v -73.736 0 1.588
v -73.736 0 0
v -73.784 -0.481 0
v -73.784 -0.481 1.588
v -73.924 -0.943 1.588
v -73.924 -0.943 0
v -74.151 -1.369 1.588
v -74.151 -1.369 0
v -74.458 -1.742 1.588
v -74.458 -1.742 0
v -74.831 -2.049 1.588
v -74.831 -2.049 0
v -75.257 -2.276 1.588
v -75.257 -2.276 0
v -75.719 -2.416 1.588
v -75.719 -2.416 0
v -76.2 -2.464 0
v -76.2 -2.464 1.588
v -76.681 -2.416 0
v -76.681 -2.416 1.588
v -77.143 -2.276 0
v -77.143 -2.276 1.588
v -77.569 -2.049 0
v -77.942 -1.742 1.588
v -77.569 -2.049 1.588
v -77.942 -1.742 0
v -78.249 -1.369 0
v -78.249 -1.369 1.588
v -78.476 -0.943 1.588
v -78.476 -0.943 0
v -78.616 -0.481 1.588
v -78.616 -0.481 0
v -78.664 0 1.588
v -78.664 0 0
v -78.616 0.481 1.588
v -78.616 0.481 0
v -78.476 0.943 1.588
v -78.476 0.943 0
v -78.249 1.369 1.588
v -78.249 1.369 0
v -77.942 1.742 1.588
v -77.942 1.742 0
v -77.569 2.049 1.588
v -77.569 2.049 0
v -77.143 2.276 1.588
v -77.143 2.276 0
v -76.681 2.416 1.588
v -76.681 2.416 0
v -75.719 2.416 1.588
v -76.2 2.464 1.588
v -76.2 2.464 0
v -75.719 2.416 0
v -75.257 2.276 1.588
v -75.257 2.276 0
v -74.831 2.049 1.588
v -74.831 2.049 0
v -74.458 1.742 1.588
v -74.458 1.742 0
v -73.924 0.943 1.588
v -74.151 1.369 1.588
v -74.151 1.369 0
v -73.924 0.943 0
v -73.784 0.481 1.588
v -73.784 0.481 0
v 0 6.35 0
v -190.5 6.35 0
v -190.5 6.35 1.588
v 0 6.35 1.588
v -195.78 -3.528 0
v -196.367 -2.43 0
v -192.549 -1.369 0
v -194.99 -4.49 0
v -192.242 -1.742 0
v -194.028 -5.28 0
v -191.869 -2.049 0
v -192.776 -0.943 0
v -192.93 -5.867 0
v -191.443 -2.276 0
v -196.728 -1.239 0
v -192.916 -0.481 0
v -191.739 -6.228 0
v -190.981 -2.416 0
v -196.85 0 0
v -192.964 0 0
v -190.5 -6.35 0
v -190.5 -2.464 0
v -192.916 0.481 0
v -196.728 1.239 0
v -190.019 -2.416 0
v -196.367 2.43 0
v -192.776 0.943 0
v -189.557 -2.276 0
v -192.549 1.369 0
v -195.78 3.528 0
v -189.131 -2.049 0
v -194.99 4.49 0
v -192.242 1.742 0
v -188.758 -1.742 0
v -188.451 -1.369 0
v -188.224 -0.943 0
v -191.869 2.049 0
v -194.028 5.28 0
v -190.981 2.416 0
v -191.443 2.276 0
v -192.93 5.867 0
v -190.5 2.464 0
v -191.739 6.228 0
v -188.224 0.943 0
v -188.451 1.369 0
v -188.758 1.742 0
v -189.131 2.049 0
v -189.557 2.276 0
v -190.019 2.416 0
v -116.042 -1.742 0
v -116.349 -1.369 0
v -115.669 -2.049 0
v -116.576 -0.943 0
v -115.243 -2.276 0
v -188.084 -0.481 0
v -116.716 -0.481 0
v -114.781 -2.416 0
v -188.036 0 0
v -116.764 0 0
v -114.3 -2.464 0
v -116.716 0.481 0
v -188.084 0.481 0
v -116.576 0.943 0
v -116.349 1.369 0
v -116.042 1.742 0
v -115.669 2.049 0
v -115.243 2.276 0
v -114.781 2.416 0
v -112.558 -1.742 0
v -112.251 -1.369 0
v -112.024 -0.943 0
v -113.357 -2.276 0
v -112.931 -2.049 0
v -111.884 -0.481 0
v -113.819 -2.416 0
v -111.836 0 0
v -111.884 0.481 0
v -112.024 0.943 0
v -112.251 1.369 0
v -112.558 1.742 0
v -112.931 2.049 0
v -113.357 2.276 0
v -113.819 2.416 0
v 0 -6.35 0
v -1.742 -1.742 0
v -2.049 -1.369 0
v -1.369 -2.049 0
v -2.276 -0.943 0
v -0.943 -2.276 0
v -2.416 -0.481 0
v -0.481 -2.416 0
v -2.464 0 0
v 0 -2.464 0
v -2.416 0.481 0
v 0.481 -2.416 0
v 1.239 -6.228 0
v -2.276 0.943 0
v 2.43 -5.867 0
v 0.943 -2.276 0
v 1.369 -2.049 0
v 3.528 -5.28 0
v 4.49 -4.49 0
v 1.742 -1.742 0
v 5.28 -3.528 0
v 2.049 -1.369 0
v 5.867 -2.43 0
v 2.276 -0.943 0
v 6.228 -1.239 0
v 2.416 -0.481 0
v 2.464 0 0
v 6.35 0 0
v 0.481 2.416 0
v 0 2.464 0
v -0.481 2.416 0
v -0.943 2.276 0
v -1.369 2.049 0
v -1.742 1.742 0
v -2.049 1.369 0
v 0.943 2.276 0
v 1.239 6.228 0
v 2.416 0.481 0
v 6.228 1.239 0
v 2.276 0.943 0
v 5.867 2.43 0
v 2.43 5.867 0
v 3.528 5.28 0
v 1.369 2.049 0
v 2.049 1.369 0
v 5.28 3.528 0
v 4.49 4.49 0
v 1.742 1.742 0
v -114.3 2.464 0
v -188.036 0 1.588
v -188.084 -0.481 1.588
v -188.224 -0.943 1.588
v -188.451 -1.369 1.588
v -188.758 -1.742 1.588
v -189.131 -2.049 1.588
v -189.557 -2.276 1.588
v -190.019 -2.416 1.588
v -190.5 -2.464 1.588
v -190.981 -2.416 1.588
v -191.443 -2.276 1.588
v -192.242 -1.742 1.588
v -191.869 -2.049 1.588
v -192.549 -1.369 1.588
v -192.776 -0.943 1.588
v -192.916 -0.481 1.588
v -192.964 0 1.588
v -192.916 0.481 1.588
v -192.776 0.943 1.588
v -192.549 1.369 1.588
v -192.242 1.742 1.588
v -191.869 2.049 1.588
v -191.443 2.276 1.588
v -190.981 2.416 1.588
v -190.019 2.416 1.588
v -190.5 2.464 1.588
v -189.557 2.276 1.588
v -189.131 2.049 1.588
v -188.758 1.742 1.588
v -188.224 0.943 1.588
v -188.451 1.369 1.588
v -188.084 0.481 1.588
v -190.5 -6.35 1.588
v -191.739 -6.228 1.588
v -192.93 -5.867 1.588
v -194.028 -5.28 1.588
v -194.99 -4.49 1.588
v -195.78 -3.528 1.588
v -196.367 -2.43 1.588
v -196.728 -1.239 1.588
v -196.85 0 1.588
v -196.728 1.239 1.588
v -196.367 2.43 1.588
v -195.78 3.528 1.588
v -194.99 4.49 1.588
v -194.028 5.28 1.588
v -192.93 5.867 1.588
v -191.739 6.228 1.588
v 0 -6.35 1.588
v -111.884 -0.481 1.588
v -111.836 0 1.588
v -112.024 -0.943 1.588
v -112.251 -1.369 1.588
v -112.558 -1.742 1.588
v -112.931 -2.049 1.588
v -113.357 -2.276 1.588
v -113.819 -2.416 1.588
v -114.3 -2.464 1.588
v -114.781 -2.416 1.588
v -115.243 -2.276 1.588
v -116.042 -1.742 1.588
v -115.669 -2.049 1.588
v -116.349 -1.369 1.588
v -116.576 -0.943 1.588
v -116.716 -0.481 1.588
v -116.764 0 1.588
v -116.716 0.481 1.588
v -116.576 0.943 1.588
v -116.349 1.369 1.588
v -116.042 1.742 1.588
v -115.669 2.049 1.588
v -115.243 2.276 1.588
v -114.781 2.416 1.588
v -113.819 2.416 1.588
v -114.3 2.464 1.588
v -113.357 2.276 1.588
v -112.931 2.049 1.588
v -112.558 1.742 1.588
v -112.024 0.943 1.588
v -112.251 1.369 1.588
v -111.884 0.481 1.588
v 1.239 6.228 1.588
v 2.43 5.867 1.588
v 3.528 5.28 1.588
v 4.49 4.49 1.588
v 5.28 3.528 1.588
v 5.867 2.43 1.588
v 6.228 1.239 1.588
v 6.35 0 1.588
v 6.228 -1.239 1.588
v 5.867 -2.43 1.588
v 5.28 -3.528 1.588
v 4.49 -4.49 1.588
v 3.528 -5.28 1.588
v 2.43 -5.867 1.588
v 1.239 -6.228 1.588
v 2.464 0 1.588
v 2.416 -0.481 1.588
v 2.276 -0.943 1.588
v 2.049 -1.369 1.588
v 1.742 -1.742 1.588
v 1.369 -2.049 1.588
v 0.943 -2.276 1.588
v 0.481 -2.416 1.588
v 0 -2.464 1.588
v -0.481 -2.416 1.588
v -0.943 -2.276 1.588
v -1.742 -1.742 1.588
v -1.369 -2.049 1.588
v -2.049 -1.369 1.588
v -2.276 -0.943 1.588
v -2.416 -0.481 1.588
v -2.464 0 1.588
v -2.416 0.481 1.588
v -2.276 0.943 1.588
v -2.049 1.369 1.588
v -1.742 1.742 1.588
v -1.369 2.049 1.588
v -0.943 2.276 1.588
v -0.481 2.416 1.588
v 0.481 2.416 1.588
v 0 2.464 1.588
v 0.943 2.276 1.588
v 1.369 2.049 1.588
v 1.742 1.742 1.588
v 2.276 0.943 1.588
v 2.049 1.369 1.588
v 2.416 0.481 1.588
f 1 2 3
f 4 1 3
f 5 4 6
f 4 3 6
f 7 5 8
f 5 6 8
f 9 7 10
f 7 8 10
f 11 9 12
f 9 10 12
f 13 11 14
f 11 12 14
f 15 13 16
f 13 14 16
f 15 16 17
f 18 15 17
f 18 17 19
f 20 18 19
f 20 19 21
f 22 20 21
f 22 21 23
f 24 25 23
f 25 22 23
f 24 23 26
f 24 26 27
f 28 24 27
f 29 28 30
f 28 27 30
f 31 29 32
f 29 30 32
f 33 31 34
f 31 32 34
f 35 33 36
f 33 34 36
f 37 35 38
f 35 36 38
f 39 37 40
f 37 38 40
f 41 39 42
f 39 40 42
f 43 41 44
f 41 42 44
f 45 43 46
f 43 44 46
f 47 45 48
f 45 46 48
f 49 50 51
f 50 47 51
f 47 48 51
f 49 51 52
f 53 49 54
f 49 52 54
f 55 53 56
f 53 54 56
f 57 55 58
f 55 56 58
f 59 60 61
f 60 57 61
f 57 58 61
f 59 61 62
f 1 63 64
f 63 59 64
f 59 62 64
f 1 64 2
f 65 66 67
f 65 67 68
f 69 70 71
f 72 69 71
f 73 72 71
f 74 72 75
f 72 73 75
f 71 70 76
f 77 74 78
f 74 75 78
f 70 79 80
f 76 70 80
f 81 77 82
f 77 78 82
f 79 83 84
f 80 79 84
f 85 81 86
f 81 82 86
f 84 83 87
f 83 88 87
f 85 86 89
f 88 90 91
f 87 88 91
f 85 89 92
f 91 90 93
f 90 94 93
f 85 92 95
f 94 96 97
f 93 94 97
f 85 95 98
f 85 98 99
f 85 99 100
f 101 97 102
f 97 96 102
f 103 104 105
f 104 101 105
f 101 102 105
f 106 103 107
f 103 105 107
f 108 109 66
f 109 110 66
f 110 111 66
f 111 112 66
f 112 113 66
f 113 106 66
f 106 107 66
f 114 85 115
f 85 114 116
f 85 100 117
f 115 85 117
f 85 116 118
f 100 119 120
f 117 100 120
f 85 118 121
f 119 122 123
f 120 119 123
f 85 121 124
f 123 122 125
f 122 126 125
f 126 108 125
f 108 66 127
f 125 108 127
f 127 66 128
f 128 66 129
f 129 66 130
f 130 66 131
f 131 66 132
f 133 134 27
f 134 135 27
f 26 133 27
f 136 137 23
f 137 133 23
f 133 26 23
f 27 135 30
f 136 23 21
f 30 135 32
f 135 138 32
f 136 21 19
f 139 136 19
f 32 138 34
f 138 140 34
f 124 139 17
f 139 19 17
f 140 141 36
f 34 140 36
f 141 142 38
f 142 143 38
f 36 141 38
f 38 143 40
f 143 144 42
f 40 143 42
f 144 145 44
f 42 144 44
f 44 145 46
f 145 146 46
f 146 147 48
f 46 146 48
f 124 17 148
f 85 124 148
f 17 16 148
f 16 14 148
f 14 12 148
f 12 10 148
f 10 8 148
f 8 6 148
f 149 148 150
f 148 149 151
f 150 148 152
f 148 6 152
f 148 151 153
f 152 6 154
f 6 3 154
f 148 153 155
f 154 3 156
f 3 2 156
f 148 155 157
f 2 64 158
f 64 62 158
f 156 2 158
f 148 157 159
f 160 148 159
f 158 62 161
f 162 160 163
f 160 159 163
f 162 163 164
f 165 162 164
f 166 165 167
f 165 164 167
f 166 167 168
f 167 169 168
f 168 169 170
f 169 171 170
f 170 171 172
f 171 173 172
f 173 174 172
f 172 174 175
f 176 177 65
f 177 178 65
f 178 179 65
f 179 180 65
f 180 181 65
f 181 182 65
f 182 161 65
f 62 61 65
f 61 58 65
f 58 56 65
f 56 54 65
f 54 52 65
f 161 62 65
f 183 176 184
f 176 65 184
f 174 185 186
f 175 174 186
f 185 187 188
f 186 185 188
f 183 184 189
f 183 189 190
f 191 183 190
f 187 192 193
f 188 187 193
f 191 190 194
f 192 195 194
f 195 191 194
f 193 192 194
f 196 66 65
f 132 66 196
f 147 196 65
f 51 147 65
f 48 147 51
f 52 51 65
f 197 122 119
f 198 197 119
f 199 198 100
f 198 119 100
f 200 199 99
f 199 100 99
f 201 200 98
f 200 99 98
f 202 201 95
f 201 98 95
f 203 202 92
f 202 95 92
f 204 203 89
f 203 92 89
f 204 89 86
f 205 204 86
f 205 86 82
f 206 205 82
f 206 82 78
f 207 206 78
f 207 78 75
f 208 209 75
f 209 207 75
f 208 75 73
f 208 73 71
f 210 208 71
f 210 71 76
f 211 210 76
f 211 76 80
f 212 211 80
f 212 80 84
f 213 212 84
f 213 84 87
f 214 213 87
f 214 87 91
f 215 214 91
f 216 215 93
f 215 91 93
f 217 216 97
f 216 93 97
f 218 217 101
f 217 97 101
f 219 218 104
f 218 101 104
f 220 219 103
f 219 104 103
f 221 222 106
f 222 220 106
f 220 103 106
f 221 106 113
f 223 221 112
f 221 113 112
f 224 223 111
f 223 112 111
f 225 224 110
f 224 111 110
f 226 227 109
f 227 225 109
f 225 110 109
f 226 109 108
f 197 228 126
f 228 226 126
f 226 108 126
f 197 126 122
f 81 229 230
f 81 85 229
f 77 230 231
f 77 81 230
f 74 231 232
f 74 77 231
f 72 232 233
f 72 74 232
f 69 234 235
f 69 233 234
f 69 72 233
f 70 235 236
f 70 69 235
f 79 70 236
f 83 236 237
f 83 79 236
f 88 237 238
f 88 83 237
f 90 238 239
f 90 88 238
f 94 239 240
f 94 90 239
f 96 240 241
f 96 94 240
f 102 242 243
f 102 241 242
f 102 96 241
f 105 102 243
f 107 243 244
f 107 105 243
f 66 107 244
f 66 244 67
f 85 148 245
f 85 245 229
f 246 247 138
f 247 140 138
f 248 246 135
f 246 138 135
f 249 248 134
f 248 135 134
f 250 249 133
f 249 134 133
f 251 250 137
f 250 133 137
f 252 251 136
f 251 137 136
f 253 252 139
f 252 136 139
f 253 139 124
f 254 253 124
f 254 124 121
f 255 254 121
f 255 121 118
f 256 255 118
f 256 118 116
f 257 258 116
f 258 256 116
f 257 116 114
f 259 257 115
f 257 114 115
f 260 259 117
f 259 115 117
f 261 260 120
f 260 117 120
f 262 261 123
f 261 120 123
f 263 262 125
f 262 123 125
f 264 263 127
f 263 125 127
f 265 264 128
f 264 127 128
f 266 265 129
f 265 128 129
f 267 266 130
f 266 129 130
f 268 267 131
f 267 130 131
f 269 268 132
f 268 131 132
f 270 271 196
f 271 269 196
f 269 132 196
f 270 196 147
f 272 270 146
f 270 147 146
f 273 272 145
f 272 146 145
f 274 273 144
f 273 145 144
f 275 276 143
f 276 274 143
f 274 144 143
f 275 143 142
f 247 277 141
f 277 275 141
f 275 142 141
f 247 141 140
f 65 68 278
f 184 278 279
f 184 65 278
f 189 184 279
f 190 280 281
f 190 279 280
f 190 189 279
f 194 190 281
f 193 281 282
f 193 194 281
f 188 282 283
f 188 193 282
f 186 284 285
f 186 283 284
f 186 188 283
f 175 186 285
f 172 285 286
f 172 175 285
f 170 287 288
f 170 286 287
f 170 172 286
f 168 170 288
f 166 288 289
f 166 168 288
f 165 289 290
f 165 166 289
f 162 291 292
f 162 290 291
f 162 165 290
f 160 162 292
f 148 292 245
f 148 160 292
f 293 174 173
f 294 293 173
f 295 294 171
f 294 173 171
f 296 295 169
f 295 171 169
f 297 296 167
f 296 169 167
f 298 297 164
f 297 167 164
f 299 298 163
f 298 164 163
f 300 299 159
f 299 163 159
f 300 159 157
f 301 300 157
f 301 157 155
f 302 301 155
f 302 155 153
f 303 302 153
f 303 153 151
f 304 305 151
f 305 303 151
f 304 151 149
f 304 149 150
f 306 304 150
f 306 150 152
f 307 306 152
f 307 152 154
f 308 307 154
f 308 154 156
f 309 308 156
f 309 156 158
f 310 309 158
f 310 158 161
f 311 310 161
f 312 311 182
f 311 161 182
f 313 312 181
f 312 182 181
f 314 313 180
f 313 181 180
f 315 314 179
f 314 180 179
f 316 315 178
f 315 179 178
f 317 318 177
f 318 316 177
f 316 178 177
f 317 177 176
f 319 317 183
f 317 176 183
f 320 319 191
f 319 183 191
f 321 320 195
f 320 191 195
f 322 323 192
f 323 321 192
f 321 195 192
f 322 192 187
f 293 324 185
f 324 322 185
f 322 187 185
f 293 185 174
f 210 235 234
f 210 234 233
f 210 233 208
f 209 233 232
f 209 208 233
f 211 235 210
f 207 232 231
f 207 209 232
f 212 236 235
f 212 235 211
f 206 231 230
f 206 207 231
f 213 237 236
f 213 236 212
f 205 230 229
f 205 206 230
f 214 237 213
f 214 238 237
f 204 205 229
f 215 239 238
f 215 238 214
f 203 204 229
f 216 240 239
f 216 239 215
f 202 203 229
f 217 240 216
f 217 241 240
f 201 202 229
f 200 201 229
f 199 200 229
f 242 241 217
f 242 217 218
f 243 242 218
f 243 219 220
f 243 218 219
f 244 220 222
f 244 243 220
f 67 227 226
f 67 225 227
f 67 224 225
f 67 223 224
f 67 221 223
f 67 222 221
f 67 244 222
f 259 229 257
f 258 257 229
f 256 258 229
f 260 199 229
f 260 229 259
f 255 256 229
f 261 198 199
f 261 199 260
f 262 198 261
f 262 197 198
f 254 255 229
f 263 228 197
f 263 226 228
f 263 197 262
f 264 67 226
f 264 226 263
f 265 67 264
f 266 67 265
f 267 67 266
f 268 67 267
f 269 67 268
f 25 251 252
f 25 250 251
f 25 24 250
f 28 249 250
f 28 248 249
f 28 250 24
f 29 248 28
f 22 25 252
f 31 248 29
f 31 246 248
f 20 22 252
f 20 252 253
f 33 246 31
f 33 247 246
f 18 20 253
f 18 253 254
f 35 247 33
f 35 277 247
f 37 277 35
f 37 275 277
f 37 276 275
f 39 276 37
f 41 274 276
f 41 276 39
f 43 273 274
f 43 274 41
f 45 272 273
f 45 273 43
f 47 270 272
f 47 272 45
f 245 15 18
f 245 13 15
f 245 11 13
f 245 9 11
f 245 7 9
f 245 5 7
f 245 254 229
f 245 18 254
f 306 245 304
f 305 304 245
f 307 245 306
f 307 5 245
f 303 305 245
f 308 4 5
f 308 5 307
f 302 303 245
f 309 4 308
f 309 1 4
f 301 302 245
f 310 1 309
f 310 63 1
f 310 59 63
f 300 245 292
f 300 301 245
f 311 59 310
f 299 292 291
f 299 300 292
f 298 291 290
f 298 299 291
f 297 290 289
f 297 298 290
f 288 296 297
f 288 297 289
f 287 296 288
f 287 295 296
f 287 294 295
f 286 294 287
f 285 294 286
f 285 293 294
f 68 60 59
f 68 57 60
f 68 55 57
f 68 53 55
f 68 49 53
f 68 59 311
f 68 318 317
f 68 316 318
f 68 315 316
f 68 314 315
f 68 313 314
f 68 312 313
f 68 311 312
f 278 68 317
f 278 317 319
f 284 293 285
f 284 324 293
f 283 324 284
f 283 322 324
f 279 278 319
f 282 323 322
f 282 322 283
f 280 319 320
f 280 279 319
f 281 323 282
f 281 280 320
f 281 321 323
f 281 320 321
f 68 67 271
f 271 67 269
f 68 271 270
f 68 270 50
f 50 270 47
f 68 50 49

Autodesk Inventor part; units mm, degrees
ref_plane "YZ Plane" through (0, 0, 0) normal (1, 0, 0) x (0, 1, 0)
ref_plane "XZ Plane" through (0, 0, 0) normal (0, 1, 0) x (-1, 0, 0)
ref_plane "XY Plane" through (0, 0, 0) normal (0, 0, 1) x (1, 0, 0)
ref_plane "Work Plane1" through (-190.5, 0, 0) normal (0, 0, 1) x (1, 0, 0)
sketch "Sketch1" plane through (-190.5, 0, 0) normal (0, 0, 1) x (1, 0, 0)
  circle A0 centre (0, 0) radius 2.4638 projected
  circle A1 centre (76.2, 0) radius 2.4638 projected
  circle A2 centre (114.3, 0) radius 2.4638 projected
  circle A3 centre (190.5, 0) radius 2.4638 projected
  circle A4 centre (0, 0) radius 6.35
  circle A5 centre (190.5, 0) radius 6.35
  line L0 (0, 6.35) -> (190.5, 6.35)
  line L1 (190.5, -6.35) -> (0, -6.35)
  point P0 (190.5, 0)
  dimension "d0" = 12.7
  dimension "d1" = 12.7
extrude "Extrusion1" add sketch "Sketch1" along normal blind 1.5875
properties part number "bottomSled"
